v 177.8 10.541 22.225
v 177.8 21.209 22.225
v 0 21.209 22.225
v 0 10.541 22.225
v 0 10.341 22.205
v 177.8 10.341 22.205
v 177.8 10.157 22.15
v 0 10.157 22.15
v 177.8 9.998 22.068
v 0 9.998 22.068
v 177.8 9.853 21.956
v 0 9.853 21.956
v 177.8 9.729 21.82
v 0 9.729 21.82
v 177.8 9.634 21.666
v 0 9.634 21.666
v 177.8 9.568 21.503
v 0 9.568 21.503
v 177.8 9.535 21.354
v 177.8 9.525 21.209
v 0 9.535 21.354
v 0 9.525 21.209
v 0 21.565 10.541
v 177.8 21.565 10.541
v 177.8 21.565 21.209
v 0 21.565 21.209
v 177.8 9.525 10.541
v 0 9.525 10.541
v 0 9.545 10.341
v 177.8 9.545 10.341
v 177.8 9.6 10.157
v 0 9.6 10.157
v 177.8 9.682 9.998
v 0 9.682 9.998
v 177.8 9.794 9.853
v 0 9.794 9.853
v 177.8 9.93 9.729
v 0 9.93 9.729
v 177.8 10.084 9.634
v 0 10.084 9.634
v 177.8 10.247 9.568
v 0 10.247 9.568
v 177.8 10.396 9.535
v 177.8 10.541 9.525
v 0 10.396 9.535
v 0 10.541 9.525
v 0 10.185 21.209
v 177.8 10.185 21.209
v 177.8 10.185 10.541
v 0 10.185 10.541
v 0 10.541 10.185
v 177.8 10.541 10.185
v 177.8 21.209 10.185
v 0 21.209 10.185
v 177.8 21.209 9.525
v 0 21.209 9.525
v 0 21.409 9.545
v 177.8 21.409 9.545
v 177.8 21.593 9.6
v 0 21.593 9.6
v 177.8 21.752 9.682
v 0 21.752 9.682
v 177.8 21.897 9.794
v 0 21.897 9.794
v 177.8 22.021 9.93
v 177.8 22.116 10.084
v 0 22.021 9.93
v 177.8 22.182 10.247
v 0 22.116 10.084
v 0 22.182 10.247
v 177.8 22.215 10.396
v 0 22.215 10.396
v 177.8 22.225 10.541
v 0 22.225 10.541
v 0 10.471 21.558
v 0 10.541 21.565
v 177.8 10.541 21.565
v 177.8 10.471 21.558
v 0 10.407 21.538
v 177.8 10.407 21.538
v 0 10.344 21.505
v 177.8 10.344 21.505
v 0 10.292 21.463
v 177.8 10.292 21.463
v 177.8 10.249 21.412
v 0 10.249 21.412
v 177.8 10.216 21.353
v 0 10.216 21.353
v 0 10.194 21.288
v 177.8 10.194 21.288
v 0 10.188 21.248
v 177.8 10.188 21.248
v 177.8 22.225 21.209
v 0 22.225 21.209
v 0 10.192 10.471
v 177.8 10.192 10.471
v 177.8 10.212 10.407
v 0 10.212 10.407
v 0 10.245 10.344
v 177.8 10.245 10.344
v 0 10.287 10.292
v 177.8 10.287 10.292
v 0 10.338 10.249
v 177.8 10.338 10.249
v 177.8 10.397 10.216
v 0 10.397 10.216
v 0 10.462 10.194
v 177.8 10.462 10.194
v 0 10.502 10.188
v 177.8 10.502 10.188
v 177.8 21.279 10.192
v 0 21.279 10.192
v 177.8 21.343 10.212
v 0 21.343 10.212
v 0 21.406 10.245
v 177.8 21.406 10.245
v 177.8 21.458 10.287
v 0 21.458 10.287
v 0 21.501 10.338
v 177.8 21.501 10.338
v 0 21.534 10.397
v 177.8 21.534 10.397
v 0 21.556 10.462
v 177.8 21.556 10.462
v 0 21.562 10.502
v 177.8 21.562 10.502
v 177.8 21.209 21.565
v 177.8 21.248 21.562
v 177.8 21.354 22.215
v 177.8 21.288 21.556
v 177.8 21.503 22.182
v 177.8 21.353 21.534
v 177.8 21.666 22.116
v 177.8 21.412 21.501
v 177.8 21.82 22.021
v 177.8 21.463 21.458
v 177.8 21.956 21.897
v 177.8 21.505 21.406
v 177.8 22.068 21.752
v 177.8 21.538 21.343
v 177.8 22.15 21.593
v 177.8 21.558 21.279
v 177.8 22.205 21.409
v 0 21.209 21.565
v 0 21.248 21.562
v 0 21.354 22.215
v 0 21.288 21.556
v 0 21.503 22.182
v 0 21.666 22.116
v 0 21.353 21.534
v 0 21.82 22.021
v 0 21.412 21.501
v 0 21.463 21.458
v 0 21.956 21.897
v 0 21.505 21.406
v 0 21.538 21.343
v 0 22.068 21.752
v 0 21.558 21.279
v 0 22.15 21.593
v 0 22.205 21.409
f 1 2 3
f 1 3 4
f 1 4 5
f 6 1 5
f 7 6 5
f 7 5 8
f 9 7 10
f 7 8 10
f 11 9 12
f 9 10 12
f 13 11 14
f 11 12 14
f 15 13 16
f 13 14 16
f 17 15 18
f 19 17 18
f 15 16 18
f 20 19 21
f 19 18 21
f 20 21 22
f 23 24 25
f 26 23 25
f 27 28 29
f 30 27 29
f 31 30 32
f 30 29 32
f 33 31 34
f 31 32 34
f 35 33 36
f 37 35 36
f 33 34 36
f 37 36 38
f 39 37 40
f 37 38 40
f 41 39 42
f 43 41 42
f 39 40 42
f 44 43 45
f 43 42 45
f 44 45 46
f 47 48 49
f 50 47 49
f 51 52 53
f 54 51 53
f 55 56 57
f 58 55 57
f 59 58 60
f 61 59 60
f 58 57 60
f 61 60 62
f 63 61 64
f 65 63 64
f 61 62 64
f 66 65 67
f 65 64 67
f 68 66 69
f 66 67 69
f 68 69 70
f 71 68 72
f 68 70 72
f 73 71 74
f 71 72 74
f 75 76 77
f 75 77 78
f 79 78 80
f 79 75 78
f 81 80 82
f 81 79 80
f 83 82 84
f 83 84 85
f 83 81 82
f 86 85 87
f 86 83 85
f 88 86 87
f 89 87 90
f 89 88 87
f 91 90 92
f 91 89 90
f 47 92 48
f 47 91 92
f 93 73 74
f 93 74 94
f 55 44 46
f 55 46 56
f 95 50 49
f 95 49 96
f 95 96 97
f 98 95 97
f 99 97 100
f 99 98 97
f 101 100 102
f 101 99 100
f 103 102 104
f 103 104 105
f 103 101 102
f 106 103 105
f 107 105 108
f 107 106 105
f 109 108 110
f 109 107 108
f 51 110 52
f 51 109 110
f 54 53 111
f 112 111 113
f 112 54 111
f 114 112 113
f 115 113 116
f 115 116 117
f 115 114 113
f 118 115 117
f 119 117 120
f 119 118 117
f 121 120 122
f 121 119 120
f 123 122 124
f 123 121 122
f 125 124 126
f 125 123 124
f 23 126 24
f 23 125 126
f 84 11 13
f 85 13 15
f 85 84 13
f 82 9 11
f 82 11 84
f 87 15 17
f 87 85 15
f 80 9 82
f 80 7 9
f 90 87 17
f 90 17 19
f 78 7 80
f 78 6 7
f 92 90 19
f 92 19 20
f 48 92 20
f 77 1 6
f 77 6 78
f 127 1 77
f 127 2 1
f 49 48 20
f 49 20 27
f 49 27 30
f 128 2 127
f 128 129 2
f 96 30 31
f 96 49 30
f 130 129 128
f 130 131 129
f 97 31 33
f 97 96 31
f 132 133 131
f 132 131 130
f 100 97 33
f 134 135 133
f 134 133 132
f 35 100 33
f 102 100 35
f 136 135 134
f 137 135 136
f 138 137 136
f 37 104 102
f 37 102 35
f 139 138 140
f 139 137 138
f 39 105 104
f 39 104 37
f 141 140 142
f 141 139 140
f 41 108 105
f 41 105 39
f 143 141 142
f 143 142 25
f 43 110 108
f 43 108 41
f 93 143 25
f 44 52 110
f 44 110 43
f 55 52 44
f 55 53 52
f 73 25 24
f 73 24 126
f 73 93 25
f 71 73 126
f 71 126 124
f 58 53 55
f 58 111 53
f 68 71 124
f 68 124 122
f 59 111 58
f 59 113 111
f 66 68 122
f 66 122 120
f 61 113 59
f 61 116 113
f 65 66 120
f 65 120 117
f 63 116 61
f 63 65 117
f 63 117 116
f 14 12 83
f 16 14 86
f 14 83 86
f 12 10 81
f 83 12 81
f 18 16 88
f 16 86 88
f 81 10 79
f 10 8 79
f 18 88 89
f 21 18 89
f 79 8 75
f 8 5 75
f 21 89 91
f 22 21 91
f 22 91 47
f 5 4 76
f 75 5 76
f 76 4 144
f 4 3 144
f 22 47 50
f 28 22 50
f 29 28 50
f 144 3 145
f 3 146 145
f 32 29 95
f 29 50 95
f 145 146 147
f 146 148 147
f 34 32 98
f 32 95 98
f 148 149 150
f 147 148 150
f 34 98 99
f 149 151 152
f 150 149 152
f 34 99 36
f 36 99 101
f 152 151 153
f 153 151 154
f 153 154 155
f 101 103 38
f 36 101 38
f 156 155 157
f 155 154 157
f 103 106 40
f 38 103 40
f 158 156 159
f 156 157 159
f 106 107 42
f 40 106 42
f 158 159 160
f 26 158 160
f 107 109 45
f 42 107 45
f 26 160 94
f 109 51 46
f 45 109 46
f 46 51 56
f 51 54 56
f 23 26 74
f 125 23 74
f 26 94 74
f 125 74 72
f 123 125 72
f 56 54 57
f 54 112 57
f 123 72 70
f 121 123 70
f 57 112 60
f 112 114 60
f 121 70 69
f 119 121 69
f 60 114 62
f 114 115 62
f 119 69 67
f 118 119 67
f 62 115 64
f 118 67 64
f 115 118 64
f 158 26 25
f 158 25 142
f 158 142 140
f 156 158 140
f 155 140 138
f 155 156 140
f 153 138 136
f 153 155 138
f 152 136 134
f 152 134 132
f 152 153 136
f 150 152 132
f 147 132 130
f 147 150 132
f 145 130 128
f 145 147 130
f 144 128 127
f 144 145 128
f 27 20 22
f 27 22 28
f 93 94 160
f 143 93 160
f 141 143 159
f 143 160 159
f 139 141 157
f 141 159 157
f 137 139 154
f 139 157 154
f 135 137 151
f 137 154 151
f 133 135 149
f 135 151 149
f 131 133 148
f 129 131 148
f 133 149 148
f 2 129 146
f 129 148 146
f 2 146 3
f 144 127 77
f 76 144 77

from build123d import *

# Parameters (mm, degrees)
BOSS_EXTRUDE1_DEPTH = 177.8
SCALE1_SCALE_X      = 1
SCALE1_SCALE_Y      = 0.4
SCALE1_SCALE_Z      = 0.4


with BuildPart() as part:
    # Sketch1 → Boss-Extrude1 (new body)
    with BuildSketch(Plane(origin=(0, 0, 0), x_dir=(0, 0, -1), z_dir=(1, 0, 0))):
        with BuildLine():
            Line((0, 2.54), (0, 29.21))
            ThreePointArc((0, 29.21), (-0.743948776, 31.006051224), (-2.54, 31.75))
            Line((-2.54, 31.75), (-29.21, 31.75))
            ThreePointArc((-29.21, 31.75), (-31.006051224, 31.006051224), (-31.75, 29.21))
            Line((-31.75, 29.21), (-31.75, 2.54))
            ThreePointArc((-31.75, 2.54), (-31.006051224, 0.743948776), (-29.21, 0))
            Line((-29.21, 0), (-2.54, 0))
            ThreePointArc((-2.54, 0), (-0.743948776, 0.743948776), (0, 2.54))
        make_face()
        with BuildLine():
            Line((-1.651, 2.54), (-1.651, 29.21))
            ThreePointArc((-1.651, 29.21), (-1.911382072, 29.838617928), (-2.54, 30.099))
            Line((-2.54, 30.099), (-29.21, 30.099))
            ThreePointArc((-29.21, 30.099), (-29.838617928, 29.838617928), (-30.099, 29.21))
            Line((-30.099, 29.21), (-30.099, 2.54))
            ThreePointArc((-30.099, 2.54), (-29.838617928, 1.911382072), (-29.21, 1.651))
            Line((-29.21, 1.651), (-2.54, 1.651))
            ThreePointArc((-2.54, 1.651), (-1.911382072, 1.911382072), (-1.651, 2.54))
        make_face(mode=Mode.SUBTRACT)
    extrude(amount=BOSS_EXTRUDE1_DEPTH)


with BuildPart() as part_1:
    # Scale1: scaled about (88.9, 15.875, 15.875)
    add(part.part.scale((SCALE1_SCALE_X, SCALE1_SCALE_Y, SCALE1_SCALE_Z), about=(88.9, 15.875, 15.875)))


solid = part_1.part
